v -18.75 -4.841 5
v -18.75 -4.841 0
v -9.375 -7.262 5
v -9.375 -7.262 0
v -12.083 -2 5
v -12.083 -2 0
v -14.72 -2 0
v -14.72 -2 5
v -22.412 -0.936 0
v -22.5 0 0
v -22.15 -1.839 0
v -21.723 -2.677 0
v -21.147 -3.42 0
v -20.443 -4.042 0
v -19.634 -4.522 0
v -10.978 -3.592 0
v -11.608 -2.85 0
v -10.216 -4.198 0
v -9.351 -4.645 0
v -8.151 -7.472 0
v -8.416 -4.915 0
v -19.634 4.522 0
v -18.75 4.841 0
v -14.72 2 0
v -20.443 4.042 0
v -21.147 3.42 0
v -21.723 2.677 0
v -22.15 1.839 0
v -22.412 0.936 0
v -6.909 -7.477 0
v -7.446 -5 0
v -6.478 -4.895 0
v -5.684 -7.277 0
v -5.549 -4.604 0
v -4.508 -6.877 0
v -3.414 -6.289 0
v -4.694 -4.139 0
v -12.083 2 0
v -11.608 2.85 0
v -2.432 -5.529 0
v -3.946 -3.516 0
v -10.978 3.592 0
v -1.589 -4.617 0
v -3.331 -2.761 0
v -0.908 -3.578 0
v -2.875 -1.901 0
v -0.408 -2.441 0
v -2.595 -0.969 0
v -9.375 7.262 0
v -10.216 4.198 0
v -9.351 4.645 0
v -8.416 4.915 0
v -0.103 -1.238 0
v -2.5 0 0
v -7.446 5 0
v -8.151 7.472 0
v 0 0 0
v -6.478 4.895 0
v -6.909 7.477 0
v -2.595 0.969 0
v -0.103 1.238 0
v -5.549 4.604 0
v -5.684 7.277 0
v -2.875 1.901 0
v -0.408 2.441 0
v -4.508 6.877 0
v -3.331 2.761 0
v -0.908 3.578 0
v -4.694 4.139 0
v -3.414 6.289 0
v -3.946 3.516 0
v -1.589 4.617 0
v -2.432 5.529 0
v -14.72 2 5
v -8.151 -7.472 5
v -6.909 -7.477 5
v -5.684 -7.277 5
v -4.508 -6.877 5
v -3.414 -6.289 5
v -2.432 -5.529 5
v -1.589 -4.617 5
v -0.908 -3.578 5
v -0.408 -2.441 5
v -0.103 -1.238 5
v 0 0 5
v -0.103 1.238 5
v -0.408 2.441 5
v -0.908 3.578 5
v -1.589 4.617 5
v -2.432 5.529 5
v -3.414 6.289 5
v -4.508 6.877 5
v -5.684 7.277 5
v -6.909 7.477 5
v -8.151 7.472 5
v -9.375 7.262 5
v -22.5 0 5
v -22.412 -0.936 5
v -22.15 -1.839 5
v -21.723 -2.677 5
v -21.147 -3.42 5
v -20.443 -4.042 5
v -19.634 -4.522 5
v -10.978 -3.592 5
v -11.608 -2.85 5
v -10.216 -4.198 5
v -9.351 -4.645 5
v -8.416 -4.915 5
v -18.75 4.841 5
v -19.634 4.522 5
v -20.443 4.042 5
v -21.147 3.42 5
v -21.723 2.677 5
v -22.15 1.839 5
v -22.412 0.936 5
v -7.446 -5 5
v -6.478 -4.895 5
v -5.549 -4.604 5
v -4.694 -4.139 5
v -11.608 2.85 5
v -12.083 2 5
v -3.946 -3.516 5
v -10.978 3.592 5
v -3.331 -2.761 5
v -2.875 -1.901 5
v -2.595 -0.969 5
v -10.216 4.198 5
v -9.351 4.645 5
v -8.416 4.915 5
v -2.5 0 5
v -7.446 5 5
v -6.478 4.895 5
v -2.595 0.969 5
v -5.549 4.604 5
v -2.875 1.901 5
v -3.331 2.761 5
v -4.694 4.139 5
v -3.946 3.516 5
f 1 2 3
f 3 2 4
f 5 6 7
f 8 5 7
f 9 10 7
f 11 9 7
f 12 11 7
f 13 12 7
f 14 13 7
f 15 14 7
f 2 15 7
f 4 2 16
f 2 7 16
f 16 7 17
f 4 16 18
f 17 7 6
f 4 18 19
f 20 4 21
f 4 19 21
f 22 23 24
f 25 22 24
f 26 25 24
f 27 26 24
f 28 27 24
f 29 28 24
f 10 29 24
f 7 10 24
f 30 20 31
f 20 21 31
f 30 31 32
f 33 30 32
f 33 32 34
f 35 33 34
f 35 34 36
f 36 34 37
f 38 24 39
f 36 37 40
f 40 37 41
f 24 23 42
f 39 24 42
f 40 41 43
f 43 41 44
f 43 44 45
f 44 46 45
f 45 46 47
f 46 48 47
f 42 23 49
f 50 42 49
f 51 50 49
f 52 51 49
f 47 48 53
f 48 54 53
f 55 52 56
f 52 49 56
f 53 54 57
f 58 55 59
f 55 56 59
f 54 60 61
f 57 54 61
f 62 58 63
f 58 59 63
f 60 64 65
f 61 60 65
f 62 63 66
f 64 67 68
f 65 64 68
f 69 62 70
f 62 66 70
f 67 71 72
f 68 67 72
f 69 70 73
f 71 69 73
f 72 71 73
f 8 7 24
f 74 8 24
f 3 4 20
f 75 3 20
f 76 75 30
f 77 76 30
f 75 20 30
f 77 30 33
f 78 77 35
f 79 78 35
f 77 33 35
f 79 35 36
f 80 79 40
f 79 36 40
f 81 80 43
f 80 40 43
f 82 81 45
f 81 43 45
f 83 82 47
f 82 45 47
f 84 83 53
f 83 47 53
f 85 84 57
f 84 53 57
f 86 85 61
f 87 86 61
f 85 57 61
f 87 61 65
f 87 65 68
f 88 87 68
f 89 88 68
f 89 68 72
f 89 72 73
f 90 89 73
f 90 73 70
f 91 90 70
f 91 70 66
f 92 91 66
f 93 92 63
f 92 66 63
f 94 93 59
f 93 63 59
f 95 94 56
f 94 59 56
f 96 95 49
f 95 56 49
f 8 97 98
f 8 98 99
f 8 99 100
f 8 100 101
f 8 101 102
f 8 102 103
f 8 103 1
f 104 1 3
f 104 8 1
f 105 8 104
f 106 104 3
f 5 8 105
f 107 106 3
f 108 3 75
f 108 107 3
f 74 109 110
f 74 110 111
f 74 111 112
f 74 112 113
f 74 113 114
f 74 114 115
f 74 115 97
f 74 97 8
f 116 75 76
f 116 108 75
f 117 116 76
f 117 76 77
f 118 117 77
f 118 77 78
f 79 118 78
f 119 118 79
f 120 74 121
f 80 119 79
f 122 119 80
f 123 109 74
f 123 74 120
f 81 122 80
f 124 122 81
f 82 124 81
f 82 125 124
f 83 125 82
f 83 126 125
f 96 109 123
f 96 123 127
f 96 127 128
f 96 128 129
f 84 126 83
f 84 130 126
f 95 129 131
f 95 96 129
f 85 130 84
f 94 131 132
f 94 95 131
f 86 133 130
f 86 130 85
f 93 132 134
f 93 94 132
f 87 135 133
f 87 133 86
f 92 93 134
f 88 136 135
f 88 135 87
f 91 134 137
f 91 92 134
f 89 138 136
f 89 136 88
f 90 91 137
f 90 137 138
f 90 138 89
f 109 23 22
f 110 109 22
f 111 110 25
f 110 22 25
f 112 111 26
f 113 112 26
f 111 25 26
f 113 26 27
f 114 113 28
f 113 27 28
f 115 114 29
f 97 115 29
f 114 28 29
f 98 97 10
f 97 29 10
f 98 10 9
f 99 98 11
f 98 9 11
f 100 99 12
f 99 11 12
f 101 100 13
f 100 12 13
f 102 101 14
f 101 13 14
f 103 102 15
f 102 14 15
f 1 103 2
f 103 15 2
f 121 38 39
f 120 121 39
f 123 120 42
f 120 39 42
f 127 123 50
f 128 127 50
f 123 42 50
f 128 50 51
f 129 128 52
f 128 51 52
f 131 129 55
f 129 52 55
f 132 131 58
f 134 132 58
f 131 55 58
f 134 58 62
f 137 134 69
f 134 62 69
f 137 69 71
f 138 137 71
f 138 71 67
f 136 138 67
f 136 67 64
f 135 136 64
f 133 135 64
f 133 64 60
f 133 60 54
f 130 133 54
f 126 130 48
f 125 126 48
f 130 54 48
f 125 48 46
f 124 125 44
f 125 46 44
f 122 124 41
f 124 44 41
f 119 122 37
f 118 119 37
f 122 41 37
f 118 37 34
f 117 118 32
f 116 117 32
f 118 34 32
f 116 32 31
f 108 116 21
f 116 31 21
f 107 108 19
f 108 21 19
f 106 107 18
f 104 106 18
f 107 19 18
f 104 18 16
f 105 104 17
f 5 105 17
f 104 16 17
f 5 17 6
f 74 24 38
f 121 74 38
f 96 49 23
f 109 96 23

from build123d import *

# Parameters (mm, degrees)
BOSS_EXTRUDE2_DEPTH = 5


with BuildPart() as part:
    # Sketch3 → Boss-Extrude2 (new body)
    with BuildSketch(Plane.XY):
        with BuildLine():
            ThreePointArc((-18.75, 4.841229183), (-22.5, 0), (-18.75, -4.841229183))
            Line((-18.75, -4.841229183), (-9.375, -7.261843774))
            ThreePointArc((-9.375, -7.261843774), (0, 0), (-9.375, 7.261843774))
            Line((-9.375, 7.261843774), (-18.75, 4.841229183))
        make_face()
        with BuildLine():
            ThreePointArc((-12.082575695, 2), (-2.5, 0), (-12.082575695, -2))
            Line((-12.082575695, -2), (-14.72, -2))
            Line((-14.72, -2), (-14.72, 2))
            Line((-14.72, 2), (-12.082575695, 2))
        make_face(mode=Mode.SUBTRACT)
    extrude(amount=BOSS_EXTRUDE2_DEPTH)


solid = part.part
